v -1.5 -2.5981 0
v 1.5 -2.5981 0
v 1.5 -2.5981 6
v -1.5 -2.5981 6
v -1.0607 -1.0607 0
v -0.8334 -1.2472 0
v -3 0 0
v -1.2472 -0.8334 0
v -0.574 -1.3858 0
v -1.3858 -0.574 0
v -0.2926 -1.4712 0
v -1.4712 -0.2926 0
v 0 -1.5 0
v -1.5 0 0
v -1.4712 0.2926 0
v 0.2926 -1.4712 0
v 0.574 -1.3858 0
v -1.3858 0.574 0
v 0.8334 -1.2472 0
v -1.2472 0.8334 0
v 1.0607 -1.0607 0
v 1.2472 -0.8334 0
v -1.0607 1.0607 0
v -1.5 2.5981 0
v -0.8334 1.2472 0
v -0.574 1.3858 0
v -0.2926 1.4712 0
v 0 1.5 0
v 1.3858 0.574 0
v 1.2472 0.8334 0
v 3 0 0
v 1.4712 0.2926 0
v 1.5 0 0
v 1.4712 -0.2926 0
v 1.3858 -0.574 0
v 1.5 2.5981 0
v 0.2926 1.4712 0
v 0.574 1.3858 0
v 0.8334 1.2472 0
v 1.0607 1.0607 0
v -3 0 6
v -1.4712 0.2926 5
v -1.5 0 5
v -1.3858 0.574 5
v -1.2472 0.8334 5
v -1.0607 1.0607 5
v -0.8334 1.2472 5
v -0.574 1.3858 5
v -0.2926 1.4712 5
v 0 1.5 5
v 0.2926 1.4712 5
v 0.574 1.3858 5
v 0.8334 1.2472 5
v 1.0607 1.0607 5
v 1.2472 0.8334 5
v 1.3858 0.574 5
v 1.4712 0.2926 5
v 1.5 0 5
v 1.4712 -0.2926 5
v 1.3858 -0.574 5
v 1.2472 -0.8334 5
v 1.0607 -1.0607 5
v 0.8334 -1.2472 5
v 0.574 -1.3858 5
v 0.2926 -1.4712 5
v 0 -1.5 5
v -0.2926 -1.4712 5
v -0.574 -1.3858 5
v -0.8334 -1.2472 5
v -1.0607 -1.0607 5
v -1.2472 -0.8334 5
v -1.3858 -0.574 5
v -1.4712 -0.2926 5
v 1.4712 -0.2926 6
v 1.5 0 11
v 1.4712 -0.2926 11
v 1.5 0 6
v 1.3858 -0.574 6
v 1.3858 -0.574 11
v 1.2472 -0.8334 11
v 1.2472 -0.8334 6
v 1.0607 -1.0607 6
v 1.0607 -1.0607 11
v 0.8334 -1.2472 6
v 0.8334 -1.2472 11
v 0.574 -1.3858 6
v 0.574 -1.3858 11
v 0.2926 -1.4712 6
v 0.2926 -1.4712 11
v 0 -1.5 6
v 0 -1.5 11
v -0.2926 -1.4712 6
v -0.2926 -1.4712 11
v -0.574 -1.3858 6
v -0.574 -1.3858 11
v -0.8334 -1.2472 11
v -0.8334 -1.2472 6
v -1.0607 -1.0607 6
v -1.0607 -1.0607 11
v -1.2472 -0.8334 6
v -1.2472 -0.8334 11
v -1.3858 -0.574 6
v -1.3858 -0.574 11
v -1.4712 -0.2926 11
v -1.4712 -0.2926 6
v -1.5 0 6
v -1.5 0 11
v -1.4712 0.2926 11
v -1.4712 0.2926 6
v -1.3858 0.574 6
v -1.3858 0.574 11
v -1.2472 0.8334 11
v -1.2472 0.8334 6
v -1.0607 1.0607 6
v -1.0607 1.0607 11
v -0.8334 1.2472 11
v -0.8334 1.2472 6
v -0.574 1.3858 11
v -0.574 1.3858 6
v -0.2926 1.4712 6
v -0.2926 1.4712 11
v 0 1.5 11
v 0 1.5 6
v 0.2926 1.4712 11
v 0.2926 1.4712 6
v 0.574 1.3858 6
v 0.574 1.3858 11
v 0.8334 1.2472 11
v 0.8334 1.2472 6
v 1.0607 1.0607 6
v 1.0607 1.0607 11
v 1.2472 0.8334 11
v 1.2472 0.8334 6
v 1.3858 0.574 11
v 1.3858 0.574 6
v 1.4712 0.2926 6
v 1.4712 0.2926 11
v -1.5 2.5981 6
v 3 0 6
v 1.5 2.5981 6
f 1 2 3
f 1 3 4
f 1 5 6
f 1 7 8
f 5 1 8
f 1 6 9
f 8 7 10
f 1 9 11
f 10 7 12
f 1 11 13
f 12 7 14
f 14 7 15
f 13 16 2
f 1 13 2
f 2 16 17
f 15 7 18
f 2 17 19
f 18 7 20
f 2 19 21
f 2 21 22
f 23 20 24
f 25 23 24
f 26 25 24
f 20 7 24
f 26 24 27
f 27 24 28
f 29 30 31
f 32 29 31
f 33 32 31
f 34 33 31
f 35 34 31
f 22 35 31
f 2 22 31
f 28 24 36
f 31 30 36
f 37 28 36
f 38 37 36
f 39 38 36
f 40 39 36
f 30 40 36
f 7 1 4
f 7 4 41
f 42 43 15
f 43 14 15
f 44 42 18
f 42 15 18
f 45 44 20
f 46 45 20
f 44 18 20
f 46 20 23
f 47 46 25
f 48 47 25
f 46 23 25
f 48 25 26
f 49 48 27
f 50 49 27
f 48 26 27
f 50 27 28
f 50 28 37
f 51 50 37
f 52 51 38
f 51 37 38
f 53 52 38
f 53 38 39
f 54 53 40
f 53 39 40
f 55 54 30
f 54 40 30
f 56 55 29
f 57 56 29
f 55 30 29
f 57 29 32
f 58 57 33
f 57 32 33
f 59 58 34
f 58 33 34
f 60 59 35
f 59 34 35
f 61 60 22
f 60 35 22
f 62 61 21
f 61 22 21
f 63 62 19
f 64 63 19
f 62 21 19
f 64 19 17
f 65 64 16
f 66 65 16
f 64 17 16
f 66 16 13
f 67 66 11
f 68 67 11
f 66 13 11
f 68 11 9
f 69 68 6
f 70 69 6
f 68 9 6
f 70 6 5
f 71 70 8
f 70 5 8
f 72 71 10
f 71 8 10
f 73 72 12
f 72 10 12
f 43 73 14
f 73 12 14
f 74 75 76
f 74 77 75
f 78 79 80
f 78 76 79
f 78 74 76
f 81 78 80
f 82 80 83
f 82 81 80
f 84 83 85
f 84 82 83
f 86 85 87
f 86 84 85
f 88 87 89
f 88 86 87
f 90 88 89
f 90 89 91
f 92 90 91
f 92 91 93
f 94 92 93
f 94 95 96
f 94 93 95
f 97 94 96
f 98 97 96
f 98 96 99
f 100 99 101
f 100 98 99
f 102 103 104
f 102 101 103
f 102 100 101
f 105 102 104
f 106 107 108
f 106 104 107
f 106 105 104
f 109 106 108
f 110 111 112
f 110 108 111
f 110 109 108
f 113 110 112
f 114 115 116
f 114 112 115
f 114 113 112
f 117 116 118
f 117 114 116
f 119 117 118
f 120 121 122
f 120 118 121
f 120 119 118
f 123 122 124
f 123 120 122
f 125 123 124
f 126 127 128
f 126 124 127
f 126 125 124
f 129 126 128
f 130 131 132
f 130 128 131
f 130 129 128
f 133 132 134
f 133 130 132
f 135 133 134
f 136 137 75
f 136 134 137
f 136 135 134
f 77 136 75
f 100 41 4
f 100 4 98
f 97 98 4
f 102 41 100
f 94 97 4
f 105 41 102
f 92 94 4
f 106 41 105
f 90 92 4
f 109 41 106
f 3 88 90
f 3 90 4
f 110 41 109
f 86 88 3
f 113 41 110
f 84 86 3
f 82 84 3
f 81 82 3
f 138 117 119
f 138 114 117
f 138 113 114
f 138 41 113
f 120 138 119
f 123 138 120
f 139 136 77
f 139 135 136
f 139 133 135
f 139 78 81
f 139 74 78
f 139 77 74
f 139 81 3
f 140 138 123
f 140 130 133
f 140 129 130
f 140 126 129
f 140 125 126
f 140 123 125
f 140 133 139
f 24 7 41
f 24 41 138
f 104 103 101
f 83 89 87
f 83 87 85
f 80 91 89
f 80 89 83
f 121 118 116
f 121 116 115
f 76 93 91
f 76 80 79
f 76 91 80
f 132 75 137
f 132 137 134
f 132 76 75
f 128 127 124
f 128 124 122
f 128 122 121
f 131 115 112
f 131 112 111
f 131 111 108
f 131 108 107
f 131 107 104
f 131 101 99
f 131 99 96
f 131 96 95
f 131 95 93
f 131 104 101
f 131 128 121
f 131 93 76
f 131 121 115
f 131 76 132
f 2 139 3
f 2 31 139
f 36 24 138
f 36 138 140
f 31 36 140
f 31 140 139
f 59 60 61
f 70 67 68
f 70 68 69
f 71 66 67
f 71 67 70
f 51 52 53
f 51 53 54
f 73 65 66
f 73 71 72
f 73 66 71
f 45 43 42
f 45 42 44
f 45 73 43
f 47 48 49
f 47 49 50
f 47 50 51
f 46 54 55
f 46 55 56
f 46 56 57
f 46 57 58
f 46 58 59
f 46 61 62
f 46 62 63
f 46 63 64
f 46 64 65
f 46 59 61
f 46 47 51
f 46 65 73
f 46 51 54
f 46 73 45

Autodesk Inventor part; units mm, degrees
ref_plane "YZ Plane" through (0, 0, 0) normal (1, 0, 0) x (0, 1, 0)
ref_plane "XZ Plane" through (0, 0, 0) normal (0, 1, 0) x (-1, 0, 0)
ref_plane "XY Plane" through (0, 0, 0) normal (0, 0, 1) x (1, 0, 0)
sketch "스케치1" plane through (0, 0, 0) normal (0, 0, 1) x (1, 0, 0)
  line L0 (-3, 0) -> (-1.5, 2.5981)
  line L1 (-1.5, 2.5981) -> (1.5, 2.5981)
  line L2 (1.5, 2.5981) -> (3, 0)
  line L3 (3, 0) -> (1.5, -2.5981)
  line L4 (1.5, -2.5981) -> (-1.5, -2.5981)
  line L5 (-1.5, -2.5981) -> (-3, 0)
  point P0 (0, 0)
  point P1 (0, 0)
  dimension "d0" = 6
extrude "돌출1" add sketch "스케치1" along normal blind 6
sketch "스케치2" plane through (0, 0, 6) normal (0, 0, 1) x (1, 0, 0)
  circle A0 centre (0, 0) radius 1.5
  dimension "d3" = 3
extrude "돌출2" add sketch "스케치2" along normal blind 5
sketch "스케치3" plane through (0, 0, 0) normal (0, 0, -1) x (-1, 0, 0)
  circle A0 centre (0, 0) radius 1.5
  dimension "d6" = 3
extrude "돌출3" cut sketch "스케치3" against normal blind 5
properties part number "50mm지지대"
